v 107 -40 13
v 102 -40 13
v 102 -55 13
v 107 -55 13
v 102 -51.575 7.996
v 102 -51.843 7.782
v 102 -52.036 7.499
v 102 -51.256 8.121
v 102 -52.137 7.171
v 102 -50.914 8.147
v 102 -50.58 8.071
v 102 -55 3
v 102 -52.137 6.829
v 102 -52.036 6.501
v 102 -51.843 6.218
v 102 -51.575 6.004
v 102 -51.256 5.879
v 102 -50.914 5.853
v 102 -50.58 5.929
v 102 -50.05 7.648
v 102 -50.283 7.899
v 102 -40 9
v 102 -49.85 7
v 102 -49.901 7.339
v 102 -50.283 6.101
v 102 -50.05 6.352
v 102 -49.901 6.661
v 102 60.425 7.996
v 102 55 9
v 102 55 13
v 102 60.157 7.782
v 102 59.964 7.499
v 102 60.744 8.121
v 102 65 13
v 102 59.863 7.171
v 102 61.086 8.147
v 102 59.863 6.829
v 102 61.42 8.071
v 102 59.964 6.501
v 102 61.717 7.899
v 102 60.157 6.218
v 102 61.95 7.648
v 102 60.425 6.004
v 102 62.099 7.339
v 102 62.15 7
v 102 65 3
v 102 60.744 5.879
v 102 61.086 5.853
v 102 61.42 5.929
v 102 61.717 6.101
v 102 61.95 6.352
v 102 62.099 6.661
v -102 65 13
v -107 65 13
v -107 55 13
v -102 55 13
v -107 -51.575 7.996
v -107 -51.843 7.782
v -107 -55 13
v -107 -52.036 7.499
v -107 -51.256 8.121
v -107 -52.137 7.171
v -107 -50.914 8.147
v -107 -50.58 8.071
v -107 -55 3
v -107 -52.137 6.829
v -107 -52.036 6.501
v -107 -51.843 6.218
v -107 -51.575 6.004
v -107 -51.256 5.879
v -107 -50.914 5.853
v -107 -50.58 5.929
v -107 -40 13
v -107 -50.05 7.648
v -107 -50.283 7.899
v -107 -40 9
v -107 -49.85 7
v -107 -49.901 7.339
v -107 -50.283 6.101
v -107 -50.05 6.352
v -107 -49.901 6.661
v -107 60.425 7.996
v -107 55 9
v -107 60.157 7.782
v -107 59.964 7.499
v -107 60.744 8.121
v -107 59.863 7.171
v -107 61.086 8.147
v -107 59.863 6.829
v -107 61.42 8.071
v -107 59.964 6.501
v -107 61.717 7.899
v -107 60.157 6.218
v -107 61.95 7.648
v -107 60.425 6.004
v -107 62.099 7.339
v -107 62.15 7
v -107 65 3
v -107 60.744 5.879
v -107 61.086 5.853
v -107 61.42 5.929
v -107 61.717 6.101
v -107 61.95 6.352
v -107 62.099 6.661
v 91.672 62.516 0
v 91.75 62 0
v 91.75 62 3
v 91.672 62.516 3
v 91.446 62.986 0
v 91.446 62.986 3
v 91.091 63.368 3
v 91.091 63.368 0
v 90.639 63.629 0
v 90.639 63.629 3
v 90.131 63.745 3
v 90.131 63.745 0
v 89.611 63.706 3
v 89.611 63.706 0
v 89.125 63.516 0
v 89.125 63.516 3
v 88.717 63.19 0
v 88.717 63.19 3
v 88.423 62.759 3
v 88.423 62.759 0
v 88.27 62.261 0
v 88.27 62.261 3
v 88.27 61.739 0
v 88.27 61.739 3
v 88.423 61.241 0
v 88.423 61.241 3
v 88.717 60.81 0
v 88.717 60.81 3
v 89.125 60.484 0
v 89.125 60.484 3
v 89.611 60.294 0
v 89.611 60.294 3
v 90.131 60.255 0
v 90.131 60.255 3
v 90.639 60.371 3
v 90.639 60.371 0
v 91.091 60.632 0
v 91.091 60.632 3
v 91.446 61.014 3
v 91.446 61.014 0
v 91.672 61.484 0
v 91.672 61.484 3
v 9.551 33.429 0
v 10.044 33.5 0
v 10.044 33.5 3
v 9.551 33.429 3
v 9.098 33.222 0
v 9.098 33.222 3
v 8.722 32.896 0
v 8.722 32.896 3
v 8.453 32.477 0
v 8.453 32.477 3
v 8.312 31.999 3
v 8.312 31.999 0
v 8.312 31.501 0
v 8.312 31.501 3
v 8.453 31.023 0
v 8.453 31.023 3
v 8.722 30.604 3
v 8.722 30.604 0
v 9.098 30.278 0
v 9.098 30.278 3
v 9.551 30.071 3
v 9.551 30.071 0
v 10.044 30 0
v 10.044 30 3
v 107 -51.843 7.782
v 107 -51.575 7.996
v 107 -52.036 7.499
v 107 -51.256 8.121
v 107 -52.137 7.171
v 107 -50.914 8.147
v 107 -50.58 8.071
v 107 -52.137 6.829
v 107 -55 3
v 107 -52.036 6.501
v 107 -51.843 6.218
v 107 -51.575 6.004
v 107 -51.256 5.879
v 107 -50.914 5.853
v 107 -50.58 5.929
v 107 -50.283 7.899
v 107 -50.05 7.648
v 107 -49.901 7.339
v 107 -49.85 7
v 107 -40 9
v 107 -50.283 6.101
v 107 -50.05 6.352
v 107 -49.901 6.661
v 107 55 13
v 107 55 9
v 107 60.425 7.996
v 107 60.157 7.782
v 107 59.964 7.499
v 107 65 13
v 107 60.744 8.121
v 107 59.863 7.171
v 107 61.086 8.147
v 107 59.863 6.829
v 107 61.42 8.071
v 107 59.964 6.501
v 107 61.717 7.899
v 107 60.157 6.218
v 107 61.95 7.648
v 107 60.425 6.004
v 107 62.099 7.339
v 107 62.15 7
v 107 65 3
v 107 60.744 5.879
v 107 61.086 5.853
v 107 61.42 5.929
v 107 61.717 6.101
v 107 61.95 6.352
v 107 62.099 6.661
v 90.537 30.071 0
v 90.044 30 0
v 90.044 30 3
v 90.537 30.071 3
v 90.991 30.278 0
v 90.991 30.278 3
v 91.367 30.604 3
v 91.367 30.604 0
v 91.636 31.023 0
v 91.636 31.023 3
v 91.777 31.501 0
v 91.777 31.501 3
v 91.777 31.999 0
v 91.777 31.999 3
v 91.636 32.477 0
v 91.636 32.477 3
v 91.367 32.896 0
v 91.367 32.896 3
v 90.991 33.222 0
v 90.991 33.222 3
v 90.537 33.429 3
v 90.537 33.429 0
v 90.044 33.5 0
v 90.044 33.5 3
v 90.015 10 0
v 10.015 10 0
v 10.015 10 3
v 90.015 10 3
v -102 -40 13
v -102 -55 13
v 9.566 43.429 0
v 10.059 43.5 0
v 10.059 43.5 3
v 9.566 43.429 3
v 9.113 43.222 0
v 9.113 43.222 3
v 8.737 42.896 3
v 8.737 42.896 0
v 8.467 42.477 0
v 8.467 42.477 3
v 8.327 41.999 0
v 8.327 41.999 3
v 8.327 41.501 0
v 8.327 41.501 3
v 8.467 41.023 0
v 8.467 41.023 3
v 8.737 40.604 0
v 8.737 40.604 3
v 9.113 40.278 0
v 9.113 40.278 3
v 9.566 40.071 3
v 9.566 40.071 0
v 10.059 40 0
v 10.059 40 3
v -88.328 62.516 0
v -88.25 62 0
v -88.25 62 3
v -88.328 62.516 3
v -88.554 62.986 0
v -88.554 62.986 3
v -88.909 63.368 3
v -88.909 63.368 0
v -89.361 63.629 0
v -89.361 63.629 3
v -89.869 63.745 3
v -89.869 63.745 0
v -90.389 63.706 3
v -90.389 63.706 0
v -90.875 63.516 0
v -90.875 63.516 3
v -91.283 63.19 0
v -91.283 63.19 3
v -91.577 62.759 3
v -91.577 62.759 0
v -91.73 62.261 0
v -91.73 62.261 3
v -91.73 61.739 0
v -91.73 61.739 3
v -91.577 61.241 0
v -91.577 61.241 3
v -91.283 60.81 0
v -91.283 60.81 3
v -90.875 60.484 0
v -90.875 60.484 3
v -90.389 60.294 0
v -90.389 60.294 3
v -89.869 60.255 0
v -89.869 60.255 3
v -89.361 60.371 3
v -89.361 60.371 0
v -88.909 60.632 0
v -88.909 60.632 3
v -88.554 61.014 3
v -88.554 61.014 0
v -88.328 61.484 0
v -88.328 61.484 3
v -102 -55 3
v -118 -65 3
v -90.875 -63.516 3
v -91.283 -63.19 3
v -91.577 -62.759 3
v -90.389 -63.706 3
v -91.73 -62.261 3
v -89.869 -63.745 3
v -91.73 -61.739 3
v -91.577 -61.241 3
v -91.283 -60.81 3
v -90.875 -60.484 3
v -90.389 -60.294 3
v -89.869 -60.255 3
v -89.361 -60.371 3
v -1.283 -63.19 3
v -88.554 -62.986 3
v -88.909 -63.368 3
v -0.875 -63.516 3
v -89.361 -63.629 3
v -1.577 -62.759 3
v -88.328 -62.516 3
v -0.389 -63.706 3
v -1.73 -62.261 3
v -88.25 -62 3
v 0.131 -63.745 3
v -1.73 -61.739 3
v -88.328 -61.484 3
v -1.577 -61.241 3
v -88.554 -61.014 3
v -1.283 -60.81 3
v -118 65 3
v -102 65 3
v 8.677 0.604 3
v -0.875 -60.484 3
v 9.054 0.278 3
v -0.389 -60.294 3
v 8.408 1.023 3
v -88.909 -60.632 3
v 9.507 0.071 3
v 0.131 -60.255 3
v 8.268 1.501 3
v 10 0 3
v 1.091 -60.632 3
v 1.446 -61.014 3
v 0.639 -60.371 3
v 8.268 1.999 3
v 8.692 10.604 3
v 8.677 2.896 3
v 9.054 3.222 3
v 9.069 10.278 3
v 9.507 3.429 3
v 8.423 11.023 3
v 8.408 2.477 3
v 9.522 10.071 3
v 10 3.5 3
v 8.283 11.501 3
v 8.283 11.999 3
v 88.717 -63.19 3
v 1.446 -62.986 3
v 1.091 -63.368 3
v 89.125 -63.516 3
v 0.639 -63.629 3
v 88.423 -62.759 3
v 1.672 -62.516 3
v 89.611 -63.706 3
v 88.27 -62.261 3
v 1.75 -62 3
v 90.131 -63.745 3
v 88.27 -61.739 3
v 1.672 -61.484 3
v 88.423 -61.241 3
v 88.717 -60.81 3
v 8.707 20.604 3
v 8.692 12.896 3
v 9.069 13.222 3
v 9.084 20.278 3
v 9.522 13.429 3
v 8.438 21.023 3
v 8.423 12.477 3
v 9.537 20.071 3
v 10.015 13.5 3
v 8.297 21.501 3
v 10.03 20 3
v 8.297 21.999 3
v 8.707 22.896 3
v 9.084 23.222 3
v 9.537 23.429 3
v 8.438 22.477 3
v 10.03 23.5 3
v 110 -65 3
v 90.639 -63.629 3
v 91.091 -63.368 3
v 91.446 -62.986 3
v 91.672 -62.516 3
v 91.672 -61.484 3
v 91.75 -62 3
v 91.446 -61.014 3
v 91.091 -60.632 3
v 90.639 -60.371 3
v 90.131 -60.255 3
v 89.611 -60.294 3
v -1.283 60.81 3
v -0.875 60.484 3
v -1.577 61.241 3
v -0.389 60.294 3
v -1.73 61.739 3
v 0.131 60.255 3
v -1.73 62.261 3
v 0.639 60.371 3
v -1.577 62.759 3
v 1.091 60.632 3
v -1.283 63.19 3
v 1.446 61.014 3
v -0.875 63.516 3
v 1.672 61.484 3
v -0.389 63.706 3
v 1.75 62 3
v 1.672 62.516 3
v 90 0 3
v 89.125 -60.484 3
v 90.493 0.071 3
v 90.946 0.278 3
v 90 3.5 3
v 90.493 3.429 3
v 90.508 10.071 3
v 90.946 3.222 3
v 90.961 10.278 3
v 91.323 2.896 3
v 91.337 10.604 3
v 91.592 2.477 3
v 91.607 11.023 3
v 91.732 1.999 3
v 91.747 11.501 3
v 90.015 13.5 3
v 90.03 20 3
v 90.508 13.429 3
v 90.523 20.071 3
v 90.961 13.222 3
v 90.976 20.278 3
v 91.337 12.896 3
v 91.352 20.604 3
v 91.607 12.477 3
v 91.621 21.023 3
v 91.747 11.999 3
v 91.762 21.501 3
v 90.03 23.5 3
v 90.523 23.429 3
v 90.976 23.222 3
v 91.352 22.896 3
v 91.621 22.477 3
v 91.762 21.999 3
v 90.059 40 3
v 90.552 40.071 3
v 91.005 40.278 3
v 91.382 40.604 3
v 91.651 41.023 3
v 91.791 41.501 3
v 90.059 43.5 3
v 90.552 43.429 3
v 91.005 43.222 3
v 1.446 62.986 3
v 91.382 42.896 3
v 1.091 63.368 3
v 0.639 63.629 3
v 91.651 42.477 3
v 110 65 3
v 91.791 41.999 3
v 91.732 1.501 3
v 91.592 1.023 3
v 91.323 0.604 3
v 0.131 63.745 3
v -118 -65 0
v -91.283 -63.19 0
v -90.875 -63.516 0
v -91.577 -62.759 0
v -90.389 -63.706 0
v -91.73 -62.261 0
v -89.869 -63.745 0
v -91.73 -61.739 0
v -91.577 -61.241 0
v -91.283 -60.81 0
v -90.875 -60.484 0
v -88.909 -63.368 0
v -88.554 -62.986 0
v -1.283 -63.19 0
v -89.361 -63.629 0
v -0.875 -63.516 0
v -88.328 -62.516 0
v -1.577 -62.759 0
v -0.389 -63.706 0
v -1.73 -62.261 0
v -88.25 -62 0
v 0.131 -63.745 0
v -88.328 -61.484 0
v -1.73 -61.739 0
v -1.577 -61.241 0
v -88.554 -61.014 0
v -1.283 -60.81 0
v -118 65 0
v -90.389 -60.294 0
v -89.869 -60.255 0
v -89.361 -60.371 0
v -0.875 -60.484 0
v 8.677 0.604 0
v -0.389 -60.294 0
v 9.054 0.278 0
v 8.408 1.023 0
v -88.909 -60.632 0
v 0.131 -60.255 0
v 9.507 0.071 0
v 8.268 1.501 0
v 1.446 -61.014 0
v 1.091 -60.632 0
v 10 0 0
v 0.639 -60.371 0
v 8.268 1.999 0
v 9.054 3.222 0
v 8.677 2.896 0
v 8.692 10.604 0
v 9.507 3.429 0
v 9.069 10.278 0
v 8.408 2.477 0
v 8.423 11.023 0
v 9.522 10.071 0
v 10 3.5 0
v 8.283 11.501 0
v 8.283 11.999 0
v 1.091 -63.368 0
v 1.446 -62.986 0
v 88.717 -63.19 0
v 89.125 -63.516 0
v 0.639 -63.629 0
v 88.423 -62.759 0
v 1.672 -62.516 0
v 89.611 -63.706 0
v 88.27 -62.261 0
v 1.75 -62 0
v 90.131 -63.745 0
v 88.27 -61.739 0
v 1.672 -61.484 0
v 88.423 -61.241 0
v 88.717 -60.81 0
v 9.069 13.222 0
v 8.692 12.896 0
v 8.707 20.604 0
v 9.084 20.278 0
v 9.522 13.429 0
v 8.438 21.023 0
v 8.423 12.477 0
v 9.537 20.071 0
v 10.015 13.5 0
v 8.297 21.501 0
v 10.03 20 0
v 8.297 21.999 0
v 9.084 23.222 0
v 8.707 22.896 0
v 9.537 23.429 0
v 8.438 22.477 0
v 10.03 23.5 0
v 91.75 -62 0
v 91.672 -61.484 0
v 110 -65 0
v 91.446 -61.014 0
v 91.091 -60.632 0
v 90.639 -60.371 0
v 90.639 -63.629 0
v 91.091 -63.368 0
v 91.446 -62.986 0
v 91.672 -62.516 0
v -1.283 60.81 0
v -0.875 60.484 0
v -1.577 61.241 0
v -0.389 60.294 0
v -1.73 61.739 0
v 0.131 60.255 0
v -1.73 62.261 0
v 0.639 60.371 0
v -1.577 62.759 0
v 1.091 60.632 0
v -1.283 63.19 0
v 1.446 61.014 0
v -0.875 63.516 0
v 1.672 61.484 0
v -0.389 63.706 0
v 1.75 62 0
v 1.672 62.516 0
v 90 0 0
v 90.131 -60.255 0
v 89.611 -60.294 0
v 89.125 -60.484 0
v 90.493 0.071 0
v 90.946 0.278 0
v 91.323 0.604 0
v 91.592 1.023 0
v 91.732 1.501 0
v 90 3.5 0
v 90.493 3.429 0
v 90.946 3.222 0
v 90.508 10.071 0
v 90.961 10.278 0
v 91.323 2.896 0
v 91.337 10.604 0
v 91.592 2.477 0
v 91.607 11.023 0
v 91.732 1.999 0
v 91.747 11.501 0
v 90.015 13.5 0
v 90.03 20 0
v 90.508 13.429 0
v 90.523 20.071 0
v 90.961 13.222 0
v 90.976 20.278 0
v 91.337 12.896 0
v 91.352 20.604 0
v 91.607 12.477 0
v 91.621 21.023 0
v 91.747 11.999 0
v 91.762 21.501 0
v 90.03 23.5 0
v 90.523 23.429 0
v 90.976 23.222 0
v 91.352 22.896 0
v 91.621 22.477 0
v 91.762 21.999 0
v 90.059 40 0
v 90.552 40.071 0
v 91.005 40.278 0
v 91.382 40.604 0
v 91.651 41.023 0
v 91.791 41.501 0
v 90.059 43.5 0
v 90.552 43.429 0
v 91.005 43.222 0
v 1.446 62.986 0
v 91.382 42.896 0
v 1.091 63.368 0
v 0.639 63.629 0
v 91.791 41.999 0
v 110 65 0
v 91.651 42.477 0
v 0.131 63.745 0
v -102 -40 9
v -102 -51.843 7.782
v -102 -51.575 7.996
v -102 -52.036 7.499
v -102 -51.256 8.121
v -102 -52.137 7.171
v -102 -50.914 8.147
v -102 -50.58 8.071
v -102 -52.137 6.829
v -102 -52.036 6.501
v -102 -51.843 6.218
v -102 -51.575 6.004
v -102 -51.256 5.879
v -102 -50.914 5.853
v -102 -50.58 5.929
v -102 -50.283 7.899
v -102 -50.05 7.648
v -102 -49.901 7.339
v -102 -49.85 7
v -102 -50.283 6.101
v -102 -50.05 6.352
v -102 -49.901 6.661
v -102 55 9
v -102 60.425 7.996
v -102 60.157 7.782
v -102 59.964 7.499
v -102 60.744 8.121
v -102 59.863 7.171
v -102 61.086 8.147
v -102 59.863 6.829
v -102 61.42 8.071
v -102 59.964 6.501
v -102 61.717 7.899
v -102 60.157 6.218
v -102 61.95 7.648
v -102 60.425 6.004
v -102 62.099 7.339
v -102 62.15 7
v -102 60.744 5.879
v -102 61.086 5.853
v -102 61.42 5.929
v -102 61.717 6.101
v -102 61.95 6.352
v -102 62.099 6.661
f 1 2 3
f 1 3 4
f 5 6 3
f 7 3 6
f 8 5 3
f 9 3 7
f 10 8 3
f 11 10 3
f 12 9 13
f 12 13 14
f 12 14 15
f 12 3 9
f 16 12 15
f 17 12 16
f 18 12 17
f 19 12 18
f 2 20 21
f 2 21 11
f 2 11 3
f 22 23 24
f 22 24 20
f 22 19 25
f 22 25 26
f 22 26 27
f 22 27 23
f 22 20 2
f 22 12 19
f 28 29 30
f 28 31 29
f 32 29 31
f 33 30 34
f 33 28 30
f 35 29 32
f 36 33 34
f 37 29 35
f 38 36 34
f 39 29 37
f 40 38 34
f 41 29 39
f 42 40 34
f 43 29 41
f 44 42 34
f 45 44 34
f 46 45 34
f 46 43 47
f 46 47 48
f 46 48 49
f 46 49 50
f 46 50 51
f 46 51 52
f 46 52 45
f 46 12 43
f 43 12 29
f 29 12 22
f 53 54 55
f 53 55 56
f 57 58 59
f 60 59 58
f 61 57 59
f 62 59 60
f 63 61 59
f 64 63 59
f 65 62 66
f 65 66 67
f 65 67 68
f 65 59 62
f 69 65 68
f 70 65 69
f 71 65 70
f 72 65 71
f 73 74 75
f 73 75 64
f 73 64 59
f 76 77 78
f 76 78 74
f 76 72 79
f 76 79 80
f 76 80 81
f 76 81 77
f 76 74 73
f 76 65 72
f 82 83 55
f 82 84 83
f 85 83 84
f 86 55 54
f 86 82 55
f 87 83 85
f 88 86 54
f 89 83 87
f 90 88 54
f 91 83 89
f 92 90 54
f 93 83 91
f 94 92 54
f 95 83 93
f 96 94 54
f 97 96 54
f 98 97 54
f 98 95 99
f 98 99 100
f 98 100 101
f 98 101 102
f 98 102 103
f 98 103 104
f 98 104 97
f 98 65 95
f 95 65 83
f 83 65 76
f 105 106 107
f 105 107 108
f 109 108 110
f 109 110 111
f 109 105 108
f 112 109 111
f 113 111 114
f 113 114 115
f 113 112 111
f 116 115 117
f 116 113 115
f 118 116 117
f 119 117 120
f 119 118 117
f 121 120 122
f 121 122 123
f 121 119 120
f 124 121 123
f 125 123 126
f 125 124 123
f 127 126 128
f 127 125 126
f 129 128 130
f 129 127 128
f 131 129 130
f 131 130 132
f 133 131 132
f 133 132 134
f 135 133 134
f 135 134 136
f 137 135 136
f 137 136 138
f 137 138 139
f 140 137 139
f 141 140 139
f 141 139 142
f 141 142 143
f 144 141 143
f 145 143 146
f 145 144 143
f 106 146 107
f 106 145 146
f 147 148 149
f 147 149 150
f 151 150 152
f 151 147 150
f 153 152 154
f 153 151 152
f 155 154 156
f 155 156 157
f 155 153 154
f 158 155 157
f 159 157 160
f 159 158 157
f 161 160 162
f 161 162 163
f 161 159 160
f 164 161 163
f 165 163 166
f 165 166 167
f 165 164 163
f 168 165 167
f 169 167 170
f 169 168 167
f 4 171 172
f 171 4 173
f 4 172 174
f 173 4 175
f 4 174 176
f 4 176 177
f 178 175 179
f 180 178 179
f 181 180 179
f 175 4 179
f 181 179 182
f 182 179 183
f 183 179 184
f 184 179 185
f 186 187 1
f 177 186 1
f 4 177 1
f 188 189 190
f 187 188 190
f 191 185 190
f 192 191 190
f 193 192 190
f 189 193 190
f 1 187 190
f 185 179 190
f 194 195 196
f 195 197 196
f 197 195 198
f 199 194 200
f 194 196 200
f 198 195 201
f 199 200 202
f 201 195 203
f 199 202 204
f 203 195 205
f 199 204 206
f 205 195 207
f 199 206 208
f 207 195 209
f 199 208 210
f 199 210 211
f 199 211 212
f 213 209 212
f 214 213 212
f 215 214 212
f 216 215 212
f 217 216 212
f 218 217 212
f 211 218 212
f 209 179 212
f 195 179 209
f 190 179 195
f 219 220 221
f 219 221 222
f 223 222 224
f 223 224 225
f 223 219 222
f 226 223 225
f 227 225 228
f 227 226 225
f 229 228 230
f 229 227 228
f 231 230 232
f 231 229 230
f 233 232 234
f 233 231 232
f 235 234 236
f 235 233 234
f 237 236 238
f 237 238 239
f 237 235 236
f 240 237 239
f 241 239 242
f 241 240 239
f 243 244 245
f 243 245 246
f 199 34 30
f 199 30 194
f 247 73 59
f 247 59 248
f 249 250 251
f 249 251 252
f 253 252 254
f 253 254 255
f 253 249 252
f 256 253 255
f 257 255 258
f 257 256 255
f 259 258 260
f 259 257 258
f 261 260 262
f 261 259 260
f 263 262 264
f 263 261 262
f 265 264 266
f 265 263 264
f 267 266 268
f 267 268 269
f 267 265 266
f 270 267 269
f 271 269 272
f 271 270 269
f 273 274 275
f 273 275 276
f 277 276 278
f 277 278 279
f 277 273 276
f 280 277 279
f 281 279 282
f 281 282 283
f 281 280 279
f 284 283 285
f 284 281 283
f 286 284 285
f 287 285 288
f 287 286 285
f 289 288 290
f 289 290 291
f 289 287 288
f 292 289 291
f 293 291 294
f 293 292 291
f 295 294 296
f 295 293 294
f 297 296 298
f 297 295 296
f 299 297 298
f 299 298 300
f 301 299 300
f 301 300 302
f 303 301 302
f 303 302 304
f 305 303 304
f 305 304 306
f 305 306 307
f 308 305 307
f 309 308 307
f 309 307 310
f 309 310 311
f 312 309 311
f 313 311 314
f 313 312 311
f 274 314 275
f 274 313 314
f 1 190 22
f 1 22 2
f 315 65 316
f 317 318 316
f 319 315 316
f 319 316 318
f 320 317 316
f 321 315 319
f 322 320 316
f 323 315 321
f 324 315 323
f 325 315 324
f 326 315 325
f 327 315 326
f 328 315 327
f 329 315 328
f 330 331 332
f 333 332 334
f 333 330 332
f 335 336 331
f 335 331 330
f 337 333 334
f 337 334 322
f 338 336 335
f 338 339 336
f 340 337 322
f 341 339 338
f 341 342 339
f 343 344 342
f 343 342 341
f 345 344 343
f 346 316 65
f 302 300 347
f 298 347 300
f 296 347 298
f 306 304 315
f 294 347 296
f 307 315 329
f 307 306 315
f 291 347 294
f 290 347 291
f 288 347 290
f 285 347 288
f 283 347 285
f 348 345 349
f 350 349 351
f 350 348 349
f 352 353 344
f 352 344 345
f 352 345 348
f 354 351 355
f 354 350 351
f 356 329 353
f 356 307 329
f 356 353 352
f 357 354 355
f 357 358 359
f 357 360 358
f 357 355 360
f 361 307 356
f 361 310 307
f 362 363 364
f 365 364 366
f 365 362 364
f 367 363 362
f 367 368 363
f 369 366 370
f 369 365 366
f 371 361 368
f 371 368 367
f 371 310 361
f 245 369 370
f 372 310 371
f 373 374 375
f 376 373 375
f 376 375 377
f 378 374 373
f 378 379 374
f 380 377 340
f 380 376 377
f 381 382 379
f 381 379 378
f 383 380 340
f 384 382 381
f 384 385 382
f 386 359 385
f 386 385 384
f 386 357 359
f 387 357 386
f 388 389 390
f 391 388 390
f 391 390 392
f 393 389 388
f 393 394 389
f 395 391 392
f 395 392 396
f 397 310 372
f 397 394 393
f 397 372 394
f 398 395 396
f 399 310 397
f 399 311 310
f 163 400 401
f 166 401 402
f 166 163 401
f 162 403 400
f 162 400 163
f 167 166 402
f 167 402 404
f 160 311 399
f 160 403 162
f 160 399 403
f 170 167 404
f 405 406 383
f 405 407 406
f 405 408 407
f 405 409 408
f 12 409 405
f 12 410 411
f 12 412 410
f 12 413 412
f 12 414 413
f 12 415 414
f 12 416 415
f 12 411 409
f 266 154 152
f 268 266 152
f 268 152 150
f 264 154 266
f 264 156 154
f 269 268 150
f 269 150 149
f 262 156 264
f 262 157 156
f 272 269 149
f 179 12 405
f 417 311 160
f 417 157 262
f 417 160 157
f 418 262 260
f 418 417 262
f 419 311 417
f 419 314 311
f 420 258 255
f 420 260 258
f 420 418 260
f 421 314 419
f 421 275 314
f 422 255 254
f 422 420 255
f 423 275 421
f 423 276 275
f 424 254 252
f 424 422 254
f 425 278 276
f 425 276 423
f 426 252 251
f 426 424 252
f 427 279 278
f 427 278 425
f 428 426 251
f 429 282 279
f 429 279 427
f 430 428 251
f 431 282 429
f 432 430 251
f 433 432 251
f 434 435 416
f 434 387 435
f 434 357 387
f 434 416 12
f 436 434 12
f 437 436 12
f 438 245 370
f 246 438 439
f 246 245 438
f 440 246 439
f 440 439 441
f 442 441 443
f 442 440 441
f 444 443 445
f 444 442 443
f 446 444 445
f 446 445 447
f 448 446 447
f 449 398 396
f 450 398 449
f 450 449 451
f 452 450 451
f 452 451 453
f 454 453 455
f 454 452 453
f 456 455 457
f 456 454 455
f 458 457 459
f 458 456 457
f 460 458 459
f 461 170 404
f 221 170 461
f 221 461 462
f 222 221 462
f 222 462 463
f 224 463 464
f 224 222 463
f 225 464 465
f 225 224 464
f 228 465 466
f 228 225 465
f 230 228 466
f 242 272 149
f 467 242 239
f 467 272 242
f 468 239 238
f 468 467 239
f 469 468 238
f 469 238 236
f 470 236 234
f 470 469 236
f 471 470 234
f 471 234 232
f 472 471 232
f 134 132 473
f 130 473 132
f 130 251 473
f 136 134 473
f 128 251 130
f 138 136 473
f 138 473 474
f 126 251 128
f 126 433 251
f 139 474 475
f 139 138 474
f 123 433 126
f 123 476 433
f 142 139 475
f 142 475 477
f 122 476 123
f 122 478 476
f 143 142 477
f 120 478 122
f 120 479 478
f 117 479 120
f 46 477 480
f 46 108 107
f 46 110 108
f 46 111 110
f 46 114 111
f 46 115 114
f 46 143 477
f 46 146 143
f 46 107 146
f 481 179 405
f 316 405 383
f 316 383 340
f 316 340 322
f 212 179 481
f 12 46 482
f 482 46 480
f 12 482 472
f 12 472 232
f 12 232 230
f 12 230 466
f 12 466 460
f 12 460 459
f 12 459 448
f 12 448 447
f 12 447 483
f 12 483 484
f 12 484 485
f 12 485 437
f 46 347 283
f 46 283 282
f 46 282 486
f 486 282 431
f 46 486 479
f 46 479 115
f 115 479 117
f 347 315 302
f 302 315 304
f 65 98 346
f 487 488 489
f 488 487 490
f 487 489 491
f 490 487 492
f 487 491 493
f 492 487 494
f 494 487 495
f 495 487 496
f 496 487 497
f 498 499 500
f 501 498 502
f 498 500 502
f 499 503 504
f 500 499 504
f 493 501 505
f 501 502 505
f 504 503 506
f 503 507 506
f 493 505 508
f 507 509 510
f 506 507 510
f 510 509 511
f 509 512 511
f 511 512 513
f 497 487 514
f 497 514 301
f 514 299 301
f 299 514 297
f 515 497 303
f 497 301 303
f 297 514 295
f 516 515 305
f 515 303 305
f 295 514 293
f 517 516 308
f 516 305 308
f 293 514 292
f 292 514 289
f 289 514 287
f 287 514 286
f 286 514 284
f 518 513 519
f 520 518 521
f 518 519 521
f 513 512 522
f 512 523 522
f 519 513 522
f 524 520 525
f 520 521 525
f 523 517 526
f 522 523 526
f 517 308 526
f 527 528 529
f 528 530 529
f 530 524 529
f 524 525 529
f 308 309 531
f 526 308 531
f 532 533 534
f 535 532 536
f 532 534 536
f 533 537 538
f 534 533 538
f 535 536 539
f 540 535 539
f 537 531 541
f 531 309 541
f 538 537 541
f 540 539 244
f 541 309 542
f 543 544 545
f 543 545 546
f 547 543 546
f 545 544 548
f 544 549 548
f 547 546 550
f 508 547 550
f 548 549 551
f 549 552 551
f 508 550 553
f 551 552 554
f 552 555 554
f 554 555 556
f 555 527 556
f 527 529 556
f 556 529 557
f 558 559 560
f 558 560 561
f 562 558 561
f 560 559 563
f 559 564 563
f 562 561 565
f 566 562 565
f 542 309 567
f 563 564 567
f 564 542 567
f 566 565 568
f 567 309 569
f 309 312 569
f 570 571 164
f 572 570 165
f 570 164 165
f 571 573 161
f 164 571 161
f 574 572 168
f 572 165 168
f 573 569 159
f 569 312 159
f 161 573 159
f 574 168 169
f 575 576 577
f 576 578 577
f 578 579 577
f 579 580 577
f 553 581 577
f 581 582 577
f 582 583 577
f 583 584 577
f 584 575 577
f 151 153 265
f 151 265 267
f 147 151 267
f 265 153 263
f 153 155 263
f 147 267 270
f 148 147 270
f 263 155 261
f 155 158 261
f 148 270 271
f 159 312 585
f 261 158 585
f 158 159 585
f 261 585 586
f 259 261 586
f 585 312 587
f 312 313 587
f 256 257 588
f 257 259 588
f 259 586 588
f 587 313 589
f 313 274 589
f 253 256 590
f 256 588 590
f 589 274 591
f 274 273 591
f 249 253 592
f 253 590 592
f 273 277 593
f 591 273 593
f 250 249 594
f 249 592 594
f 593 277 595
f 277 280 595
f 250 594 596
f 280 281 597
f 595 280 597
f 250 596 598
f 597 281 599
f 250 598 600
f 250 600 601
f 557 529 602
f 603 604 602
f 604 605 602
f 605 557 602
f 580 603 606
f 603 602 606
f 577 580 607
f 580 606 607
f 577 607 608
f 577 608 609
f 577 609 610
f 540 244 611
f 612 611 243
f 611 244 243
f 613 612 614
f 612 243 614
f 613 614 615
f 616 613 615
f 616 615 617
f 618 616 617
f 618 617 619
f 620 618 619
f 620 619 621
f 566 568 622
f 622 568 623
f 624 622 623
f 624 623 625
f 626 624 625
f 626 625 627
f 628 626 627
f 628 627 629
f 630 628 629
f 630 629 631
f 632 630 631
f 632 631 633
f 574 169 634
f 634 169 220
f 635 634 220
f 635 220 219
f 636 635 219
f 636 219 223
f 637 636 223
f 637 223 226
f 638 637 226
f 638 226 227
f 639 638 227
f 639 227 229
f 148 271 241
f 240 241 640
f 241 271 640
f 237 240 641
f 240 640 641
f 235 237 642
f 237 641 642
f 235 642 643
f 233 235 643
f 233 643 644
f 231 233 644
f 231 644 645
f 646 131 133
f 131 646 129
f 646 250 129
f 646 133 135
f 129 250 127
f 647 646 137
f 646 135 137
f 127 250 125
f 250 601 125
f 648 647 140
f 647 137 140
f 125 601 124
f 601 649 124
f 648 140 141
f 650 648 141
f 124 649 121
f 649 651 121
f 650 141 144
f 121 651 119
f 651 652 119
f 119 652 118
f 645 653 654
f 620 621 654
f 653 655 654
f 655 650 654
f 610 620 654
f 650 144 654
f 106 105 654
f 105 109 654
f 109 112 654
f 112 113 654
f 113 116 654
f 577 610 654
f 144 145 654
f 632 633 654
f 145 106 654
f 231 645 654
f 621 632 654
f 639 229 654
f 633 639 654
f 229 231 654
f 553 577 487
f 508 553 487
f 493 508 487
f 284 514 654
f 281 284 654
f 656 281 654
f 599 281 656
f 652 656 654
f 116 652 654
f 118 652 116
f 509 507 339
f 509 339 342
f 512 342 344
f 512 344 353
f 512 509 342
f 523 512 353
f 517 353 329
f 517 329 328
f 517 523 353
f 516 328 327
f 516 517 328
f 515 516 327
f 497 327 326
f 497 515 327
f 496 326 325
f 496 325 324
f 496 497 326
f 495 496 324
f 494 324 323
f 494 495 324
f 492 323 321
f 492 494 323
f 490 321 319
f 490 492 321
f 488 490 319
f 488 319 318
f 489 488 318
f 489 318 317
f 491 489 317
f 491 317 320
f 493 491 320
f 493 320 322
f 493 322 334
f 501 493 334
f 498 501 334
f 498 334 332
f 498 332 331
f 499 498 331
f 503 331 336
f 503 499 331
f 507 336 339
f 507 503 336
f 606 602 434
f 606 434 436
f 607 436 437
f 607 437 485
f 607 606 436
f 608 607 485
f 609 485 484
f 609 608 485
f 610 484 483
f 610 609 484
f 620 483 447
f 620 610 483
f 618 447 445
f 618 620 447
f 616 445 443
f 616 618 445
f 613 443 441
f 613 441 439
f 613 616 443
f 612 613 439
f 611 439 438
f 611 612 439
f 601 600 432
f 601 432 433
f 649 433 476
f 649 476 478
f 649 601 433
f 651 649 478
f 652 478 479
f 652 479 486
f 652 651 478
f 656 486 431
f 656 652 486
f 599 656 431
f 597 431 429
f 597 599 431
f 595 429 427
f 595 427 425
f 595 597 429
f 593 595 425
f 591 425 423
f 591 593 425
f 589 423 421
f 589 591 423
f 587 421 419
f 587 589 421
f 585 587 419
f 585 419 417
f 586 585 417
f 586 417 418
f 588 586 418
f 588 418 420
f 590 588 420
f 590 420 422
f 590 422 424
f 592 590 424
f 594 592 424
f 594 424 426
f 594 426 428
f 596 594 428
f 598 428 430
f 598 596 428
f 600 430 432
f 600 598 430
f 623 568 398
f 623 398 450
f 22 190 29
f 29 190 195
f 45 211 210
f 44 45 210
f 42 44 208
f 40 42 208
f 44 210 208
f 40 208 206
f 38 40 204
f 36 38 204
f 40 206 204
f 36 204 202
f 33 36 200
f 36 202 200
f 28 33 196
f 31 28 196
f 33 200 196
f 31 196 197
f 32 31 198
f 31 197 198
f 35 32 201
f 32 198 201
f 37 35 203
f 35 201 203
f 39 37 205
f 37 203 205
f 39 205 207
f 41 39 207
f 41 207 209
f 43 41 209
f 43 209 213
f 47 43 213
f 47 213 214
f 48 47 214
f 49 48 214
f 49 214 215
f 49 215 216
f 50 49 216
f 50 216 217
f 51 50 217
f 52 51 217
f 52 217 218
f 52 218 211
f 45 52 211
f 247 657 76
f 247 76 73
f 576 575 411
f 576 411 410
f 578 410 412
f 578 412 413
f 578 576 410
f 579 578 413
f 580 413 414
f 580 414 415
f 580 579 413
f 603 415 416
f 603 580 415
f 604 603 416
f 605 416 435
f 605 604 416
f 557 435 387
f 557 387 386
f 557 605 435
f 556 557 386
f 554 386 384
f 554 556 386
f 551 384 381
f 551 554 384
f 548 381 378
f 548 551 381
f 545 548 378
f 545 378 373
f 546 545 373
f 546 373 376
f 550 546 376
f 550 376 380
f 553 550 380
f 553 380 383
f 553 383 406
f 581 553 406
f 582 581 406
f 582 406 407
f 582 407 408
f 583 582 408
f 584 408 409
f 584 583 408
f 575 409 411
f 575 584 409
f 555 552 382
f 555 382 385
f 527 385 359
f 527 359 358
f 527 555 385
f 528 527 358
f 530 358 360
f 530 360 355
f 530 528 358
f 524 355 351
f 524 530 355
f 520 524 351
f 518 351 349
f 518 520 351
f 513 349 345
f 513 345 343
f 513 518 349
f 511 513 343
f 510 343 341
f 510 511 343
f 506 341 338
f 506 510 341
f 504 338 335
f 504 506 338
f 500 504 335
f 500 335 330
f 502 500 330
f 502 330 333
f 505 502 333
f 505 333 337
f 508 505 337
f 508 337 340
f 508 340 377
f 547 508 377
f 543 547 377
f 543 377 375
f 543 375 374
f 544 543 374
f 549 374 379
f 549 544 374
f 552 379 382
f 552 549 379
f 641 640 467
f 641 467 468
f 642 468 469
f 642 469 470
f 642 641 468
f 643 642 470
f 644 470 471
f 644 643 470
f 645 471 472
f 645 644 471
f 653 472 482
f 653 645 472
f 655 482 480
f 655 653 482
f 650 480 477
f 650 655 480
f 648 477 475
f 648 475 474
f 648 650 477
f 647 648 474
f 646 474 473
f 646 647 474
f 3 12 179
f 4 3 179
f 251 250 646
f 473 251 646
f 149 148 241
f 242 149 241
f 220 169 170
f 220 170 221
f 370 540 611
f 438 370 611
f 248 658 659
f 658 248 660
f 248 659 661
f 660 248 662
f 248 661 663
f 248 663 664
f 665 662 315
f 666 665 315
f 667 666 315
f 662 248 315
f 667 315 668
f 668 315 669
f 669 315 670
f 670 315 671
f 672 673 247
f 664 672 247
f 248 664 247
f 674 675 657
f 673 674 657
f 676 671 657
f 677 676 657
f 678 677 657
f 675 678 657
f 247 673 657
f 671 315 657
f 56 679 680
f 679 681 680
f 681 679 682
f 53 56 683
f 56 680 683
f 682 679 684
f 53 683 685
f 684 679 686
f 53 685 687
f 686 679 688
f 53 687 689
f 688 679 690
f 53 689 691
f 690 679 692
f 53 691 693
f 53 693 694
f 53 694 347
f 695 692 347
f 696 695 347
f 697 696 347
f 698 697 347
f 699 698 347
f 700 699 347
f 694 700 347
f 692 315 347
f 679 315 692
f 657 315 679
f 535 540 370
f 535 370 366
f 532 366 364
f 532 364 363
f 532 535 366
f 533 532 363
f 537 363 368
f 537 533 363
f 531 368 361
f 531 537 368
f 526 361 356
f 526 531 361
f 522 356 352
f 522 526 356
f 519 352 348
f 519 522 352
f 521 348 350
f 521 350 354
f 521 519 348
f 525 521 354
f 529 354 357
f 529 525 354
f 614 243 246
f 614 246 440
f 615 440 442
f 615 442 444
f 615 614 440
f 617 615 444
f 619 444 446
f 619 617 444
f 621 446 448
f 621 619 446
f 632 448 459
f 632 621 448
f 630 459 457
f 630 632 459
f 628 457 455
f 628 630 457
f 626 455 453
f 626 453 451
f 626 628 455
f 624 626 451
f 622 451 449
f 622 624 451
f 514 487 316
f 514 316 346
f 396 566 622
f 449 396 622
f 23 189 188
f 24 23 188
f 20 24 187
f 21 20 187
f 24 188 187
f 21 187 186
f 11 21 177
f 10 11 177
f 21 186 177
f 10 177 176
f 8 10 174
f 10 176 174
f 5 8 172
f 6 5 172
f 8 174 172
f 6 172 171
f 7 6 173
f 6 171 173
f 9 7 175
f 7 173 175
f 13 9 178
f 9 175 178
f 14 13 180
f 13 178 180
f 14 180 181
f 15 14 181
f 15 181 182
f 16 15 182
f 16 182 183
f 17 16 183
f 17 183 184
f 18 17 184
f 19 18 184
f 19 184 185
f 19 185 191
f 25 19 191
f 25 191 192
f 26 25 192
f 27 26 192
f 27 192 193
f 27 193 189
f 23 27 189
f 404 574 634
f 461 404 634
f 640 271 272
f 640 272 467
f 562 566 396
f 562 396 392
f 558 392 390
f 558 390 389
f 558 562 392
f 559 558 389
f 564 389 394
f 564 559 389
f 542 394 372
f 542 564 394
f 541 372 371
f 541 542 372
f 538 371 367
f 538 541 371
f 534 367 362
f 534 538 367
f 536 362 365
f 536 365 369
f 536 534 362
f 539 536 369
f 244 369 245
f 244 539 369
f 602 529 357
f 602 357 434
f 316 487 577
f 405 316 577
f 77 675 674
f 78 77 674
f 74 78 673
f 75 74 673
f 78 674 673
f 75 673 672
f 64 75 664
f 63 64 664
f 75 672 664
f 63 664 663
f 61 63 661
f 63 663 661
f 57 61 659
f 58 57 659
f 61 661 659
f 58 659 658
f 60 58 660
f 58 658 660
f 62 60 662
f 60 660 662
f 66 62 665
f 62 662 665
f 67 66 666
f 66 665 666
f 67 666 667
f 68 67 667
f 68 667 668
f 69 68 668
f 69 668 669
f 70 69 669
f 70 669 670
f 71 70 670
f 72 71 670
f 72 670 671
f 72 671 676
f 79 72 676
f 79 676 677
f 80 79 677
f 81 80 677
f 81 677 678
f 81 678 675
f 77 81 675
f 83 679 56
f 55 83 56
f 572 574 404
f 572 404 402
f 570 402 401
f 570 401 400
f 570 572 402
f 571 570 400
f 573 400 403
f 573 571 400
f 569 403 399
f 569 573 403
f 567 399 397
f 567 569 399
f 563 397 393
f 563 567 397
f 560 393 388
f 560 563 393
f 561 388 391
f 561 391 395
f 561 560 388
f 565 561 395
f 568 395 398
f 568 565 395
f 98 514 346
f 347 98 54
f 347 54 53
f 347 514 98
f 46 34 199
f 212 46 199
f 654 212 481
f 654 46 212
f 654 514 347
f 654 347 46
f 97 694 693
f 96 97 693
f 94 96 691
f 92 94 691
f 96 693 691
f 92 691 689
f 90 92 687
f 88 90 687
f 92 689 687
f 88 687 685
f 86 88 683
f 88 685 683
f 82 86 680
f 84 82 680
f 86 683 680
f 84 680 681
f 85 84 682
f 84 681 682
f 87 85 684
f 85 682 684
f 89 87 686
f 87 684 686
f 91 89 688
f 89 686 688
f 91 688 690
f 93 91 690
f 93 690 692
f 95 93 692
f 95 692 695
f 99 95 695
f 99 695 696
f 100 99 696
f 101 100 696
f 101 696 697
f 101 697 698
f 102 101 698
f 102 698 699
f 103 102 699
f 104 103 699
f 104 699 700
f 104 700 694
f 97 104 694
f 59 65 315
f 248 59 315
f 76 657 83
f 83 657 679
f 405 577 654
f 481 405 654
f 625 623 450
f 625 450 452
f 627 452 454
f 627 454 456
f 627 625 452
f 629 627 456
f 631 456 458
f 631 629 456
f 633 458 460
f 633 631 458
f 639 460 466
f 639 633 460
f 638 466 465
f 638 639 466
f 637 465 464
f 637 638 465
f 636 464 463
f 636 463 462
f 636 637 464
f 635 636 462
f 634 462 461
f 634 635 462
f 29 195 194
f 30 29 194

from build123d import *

# Parameters (mm, degrees)
SKETCH_W     = 228
SKETCH_H     = 130
SKETCH_R     = 1.75
PAD_DEPTH    = 3
SKETCH001_W  = 5
SKETCH001_H  = 120
PAD001_DEPTH = 10
SKETCH002_R  = 1.15
SKETCH002_W  = 95
SKETCH002_H  = 4
POCKET_DEPTH = 225


with BuildPart() as part:
    # Sketch → Pad (new body)
    with BuildSketch(Plane.XY):
        with Locations((-4, 0)):
            Rectangle(SKETCH_W, SKETCH_H)
        with Locations((-90, 62)):
            Circle(SKETCH_R, mode=Mode.SUBTRACT)
        with Locations((0, 62)):
            Circle(SKETCH_R, mode=Mode.SUBTRACT)
        with Locations((90, 62)):
            Circle(SKETCH_R, mode=Mode.SUBTRACT)
        with Locations((-90, -62)):
            Circle(SKETCH_R, mode=Mode.SUBTRACT)
        with Locations((0, -62)):
            Circle(SKETCH_R, mode=Mode.SUBTRACT)
        with Locations((90, -62)):
            Circle(SKETCH_R, mode=Mode.SUBTRACT)
        with BuildLine():
            ThreePointArc((10.059248, 43.499956), (8.309248, 41.749956), (10.059248, 39.999956))
            Line((10.059248, 39.999956), (90.059248, 39.999956))
            ThreePointArc((90.059248, 39.999956), (91.809248, 41.749956), (90.059248, 43.499956))
            Line((10.059248, 43.499956), (90.059248, 43.499956))
        make_face(mode=Mode.SUBTRACT)
        with BuildLine():
            ThreePointArc((10.044436, 33.499967), (8.294436, 31.749967), (10.044436, 29.999967))
            Line((10.044436, 29.999967), (90.044436, 29.999967))
            ThreePointArc((90.044436, 29.999967), (91.794436, 31.749967), (90.044436, 33.499967))
            Line((10.044436, 33.499967), (90.044436, 33.499967))
        make_face(mode=Mode.SUBTRACT)
        with BuildLine():
            ThreePointArc((10.029624, 23.499978), (8.279624, 21.749978), (10.029624, 19.999978))
            Line((10.029624, 19.999978), (90.029624, 19.999978))
            ThreePointArc((90.029624, 19.999978), (91.779624, 21.749978), (90.029624, 23.499978))
            Line((10.029624, 23.499978), (90.029624, 23.499978))
        make_face(mode=Mode.SUBTRACT)
        with BuildLine():
            ThreePointArc((10.014812, 13.499989), (8.264812, 11.749989), (10.014812, 9.999989))
            Line((10.014812, 9.999989), (90.014812, 9.999989))
            ThreePointArc((90.014812, 9.999989), (91.764812, 11.749989), (90.014812, 13.499989))
            Line((10.014812, 13.499989), (90.014812, 13.499989))
        make_face(mode=Mode.SUBTRACT)
        with BuildLine():
            ThreePointArc((10, 3.5), (8.25, 1.75), (10, 0))
            Line((10, 0), (90, 0))
            ThreePointArc((90, 0), (91.75, 1.75), (90, 3.5))
            Line((10, 3.5), (90, 3.5))
        make_face(mode=Mode.SUBTRACT)
    extrude(amount=PAD_DEPTH)

    # Sketch001 → Pad001 (join)
    with BuildSketch(Plane.XY.offset(3)):
        with Locations((104.5, 5)):
            Rectangle(SKETCH001_W, SKETCH001_H)
        with Locations((-104.5, 5)):
            Rectangle(SKETCH001_W, SKETCH001_H)
    extrude(amount=PAD001_DEPTH)

    # Sketch002 → Pocket (cut)
    with BuildSketch(Plane.YZ.offset(107)):
        with Locations((-51, 7)):
            Circle(SKETCH002_R)
        with Locations((61, 7)):
            Circle(SKETCH002_R)
        with Locations((7.5, 11)):
            Rectangle(SKETCH002_W, SKETCH002_H)
    extrude(amount=-POCKET_DEPTH, mode=Mode.SUBTRACT)


solid = part.part
